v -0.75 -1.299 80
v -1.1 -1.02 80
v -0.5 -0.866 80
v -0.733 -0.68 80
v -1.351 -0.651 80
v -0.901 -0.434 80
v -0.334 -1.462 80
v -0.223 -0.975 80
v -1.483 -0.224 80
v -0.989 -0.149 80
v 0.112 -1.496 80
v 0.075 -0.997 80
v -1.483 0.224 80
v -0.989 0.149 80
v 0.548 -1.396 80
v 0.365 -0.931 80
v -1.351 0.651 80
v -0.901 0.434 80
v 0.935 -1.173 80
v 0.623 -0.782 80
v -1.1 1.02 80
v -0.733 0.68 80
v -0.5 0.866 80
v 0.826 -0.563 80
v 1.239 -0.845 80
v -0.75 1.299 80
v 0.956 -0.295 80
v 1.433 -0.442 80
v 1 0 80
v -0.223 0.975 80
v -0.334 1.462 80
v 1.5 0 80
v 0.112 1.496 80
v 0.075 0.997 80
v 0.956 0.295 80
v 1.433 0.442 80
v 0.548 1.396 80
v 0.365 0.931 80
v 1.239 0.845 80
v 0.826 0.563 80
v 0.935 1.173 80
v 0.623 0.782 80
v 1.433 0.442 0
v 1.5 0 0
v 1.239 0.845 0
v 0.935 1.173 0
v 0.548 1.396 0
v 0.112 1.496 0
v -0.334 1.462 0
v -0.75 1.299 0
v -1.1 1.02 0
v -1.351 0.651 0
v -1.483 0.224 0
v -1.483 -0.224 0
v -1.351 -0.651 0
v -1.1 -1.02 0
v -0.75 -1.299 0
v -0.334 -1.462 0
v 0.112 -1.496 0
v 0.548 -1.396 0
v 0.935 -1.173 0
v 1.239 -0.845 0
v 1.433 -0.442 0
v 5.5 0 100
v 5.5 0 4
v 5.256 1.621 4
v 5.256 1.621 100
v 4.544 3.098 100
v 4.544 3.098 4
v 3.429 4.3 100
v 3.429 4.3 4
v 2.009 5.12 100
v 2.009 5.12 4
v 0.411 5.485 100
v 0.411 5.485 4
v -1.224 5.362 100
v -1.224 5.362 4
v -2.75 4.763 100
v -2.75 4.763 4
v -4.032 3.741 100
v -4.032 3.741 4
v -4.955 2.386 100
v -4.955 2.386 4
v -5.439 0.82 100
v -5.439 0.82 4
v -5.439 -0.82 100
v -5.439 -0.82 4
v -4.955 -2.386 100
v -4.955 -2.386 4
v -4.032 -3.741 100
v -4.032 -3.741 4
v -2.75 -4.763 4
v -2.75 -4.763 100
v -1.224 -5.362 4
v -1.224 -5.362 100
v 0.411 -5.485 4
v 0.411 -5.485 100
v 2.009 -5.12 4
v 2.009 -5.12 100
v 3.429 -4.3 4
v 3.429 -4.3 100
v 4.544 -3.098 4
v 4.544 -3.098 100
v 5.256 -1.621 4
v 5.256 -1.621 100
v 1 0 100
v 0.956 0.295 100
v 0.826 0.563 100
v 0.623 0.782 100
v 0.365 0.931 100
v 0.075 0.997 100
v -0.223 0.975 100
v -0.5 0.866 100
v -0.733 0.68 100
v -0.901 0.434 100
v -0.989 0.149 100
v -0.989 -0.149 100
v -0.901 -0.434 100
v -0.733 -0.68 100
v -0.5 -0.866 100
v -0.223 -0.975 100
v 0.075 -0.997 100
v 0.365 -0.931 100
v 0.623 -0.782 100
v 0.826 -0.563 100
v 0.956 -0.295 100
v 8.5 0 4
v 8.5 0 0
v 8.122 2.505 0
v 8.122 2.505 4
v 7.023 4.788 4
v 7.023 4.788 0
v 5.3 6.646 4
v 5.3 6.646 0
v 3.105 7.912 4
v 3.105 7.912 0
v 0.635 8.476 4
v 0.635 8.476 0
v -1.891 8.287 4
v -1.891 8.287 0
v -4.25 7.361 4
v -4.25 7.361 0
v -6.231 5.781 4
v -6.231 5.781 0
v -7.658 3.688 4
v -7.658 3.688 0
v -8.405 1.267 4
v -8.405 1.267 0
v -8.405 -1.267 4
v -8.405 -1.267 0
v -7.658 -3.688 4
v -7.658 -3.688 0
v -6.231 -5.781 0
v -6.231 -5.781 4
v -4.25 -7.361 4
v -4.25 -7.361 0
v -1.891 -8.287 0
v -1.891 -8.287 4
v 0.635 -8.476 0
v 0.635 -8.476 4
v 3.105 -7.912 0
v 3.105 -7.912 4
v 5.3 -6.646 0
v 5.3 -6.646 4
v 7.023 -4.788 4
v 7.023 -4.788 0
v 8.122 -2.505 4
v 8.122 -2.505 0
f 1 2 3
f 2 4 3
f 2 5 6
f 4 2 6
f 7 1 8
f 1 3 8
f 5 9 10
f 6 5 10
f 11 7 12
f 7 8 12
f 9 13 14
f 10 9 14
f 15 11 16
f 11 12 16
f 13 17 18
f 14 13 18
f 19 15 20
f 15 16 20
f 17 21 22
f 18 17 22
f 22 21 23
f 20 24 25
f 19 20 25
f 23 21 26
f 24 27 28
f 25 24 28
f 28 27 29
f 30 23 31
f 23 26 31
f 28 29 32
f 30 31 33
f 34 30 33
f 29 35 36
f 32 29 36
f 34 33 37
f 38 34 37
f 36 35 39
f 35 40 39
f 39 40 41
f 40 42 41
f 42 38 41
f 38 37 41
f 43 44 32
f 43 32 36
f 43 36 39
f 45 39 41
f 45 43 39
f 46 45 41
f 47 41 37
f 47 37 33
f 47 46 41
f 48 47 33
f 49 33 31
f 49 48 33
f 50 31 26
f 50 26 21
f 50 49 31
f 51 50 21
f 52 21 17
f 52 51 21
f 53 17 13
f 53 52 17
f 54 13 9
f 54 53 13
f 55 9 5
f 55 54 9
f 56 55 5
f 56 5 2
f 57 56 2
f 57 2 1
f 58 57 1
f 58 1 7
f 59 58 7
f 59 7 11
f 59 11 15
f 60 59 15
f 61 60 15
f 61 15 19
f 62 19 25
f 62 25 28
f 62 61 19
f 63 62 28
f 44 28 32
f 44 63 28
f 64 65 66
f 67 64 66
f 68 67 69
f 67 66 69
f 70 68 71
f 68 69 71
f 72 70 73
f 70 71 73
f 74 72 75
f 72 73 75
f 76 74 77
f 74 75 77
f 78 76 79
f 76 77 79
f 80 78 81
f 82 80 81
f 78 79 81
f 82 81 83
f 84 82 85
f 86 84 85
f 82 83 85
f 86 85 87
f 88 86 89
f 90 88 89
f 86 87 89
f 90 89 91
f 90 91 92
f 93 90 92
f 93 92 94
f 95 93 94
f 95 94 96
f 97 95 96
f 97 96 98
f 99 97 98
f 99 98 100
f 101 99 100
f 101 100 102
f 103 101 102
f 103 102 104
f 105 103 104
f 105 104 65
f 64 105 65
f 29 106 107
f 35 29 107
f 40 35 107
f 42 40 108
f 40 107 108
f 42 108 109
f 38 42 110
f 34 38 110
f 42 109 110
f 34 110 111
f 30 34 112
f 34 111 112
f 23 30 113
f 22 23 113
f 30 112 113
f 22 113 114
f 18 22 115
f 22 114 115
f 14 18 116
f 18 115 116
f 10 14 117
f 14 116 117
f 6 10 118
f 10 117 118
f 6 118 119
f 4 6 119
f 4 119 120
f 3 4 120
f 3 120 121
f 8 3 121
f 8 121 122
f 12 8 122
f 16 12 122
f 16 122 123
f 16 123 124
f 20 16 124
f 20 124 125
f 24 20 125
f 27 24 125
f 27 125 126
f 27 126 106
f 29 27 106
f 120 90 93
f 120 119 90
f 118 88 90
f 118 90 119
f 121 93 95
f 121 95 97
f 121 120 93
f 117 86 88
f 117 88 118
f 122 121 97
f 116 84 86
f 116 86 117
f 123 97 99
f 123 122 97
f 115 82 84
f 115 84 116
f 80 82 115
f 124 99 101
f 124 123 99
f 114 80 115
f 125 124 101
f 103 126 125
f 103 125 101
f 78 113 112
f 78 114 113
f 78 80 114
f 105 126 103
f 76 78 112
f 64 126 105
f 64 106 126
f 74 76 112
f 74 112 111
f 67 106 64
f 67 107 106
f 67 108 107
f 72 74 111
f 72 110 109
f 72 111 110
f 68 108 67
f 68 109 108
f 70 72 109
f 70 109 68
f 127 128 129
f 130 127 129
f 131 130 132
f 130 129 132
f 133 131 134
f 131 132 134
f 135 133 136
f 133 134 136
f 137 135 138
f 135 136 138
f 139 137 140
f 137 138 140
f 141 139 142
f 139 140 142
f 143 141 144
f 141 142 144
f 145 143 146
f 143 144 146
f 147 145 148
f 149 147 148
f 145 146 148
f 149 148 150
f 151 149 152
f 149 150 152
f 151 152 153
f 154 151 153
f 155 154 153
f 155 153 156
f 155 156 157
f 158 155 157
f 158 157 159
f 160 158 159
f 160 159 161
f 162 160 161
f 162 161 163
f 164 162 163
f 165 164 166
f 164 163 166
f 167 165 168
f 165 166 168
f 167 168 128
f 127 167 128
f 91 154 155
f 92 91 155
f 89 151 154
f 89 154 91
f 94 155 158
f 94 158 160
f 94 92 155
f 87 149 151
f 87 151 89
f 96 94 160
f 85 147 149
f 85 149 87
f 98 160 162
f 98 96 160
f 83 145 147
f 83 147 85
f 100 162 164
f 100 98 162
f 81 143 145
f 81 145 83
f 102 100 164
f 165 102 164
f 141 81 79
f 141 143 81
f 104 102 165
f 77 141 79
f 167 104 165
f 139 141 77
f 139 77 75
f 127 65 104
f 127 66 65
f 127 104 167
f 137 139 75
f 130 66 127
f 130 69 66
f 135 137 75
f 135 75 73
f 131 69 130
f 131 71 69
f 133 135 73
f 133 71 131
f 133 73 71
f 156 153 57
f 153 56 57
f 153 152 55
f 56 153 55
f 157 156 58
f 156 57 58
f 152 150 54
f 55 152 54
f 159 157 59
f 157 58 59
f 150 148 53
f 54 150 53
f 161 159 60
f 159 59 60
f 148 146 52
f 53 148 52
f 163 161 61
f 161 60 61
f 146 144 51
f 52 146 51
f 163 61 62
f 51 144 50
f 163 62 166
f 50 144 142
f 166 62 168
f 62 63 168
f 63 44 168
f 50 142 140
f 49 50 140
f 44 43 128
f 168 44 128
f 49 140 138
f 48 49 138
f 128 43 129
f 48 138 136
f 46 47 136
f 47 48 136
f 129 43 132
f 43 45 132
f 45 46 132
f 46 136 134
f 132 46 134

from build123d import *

# Parameters (mm, degrees)
F0_R     = 8.5
F1_DEPTH = 4
F2_R     = 5.5
F3_DEPTH = 100
F4_R     = 1
F5_DEPTH = 114.9
F6_R     = 1.5
F7_DEPTH = 80


with BuildPart() as f1:
    # F0 (on Top) → F1 (new body)
    with BuildSketch(Plane.XY):
        Circle(F0_R)
    extrude(amount=F1_DEPTH)

    # F2 (on Top) → F3 (join)
    with BuildSketch(Plane.XY):
        Circle(F2_R)
    extrude(amount=F3_DEPTH)

    # F4 (on face) → F5 (cut)
    with BuildSketch(Plane.XY.offset(100)):
        Circle(F4_R)
    extrude(amount=-F5_DEPTH, mode=Mode.SUBTRACT)

    # F6 (on Top) → F7 (cut)
    with BuildSketch(Plane.XY):
        Circle(F6_R)
    extrude(amount=F7_DEPTH, mode=Mode.SUBTRACT)


solid = f1.part
